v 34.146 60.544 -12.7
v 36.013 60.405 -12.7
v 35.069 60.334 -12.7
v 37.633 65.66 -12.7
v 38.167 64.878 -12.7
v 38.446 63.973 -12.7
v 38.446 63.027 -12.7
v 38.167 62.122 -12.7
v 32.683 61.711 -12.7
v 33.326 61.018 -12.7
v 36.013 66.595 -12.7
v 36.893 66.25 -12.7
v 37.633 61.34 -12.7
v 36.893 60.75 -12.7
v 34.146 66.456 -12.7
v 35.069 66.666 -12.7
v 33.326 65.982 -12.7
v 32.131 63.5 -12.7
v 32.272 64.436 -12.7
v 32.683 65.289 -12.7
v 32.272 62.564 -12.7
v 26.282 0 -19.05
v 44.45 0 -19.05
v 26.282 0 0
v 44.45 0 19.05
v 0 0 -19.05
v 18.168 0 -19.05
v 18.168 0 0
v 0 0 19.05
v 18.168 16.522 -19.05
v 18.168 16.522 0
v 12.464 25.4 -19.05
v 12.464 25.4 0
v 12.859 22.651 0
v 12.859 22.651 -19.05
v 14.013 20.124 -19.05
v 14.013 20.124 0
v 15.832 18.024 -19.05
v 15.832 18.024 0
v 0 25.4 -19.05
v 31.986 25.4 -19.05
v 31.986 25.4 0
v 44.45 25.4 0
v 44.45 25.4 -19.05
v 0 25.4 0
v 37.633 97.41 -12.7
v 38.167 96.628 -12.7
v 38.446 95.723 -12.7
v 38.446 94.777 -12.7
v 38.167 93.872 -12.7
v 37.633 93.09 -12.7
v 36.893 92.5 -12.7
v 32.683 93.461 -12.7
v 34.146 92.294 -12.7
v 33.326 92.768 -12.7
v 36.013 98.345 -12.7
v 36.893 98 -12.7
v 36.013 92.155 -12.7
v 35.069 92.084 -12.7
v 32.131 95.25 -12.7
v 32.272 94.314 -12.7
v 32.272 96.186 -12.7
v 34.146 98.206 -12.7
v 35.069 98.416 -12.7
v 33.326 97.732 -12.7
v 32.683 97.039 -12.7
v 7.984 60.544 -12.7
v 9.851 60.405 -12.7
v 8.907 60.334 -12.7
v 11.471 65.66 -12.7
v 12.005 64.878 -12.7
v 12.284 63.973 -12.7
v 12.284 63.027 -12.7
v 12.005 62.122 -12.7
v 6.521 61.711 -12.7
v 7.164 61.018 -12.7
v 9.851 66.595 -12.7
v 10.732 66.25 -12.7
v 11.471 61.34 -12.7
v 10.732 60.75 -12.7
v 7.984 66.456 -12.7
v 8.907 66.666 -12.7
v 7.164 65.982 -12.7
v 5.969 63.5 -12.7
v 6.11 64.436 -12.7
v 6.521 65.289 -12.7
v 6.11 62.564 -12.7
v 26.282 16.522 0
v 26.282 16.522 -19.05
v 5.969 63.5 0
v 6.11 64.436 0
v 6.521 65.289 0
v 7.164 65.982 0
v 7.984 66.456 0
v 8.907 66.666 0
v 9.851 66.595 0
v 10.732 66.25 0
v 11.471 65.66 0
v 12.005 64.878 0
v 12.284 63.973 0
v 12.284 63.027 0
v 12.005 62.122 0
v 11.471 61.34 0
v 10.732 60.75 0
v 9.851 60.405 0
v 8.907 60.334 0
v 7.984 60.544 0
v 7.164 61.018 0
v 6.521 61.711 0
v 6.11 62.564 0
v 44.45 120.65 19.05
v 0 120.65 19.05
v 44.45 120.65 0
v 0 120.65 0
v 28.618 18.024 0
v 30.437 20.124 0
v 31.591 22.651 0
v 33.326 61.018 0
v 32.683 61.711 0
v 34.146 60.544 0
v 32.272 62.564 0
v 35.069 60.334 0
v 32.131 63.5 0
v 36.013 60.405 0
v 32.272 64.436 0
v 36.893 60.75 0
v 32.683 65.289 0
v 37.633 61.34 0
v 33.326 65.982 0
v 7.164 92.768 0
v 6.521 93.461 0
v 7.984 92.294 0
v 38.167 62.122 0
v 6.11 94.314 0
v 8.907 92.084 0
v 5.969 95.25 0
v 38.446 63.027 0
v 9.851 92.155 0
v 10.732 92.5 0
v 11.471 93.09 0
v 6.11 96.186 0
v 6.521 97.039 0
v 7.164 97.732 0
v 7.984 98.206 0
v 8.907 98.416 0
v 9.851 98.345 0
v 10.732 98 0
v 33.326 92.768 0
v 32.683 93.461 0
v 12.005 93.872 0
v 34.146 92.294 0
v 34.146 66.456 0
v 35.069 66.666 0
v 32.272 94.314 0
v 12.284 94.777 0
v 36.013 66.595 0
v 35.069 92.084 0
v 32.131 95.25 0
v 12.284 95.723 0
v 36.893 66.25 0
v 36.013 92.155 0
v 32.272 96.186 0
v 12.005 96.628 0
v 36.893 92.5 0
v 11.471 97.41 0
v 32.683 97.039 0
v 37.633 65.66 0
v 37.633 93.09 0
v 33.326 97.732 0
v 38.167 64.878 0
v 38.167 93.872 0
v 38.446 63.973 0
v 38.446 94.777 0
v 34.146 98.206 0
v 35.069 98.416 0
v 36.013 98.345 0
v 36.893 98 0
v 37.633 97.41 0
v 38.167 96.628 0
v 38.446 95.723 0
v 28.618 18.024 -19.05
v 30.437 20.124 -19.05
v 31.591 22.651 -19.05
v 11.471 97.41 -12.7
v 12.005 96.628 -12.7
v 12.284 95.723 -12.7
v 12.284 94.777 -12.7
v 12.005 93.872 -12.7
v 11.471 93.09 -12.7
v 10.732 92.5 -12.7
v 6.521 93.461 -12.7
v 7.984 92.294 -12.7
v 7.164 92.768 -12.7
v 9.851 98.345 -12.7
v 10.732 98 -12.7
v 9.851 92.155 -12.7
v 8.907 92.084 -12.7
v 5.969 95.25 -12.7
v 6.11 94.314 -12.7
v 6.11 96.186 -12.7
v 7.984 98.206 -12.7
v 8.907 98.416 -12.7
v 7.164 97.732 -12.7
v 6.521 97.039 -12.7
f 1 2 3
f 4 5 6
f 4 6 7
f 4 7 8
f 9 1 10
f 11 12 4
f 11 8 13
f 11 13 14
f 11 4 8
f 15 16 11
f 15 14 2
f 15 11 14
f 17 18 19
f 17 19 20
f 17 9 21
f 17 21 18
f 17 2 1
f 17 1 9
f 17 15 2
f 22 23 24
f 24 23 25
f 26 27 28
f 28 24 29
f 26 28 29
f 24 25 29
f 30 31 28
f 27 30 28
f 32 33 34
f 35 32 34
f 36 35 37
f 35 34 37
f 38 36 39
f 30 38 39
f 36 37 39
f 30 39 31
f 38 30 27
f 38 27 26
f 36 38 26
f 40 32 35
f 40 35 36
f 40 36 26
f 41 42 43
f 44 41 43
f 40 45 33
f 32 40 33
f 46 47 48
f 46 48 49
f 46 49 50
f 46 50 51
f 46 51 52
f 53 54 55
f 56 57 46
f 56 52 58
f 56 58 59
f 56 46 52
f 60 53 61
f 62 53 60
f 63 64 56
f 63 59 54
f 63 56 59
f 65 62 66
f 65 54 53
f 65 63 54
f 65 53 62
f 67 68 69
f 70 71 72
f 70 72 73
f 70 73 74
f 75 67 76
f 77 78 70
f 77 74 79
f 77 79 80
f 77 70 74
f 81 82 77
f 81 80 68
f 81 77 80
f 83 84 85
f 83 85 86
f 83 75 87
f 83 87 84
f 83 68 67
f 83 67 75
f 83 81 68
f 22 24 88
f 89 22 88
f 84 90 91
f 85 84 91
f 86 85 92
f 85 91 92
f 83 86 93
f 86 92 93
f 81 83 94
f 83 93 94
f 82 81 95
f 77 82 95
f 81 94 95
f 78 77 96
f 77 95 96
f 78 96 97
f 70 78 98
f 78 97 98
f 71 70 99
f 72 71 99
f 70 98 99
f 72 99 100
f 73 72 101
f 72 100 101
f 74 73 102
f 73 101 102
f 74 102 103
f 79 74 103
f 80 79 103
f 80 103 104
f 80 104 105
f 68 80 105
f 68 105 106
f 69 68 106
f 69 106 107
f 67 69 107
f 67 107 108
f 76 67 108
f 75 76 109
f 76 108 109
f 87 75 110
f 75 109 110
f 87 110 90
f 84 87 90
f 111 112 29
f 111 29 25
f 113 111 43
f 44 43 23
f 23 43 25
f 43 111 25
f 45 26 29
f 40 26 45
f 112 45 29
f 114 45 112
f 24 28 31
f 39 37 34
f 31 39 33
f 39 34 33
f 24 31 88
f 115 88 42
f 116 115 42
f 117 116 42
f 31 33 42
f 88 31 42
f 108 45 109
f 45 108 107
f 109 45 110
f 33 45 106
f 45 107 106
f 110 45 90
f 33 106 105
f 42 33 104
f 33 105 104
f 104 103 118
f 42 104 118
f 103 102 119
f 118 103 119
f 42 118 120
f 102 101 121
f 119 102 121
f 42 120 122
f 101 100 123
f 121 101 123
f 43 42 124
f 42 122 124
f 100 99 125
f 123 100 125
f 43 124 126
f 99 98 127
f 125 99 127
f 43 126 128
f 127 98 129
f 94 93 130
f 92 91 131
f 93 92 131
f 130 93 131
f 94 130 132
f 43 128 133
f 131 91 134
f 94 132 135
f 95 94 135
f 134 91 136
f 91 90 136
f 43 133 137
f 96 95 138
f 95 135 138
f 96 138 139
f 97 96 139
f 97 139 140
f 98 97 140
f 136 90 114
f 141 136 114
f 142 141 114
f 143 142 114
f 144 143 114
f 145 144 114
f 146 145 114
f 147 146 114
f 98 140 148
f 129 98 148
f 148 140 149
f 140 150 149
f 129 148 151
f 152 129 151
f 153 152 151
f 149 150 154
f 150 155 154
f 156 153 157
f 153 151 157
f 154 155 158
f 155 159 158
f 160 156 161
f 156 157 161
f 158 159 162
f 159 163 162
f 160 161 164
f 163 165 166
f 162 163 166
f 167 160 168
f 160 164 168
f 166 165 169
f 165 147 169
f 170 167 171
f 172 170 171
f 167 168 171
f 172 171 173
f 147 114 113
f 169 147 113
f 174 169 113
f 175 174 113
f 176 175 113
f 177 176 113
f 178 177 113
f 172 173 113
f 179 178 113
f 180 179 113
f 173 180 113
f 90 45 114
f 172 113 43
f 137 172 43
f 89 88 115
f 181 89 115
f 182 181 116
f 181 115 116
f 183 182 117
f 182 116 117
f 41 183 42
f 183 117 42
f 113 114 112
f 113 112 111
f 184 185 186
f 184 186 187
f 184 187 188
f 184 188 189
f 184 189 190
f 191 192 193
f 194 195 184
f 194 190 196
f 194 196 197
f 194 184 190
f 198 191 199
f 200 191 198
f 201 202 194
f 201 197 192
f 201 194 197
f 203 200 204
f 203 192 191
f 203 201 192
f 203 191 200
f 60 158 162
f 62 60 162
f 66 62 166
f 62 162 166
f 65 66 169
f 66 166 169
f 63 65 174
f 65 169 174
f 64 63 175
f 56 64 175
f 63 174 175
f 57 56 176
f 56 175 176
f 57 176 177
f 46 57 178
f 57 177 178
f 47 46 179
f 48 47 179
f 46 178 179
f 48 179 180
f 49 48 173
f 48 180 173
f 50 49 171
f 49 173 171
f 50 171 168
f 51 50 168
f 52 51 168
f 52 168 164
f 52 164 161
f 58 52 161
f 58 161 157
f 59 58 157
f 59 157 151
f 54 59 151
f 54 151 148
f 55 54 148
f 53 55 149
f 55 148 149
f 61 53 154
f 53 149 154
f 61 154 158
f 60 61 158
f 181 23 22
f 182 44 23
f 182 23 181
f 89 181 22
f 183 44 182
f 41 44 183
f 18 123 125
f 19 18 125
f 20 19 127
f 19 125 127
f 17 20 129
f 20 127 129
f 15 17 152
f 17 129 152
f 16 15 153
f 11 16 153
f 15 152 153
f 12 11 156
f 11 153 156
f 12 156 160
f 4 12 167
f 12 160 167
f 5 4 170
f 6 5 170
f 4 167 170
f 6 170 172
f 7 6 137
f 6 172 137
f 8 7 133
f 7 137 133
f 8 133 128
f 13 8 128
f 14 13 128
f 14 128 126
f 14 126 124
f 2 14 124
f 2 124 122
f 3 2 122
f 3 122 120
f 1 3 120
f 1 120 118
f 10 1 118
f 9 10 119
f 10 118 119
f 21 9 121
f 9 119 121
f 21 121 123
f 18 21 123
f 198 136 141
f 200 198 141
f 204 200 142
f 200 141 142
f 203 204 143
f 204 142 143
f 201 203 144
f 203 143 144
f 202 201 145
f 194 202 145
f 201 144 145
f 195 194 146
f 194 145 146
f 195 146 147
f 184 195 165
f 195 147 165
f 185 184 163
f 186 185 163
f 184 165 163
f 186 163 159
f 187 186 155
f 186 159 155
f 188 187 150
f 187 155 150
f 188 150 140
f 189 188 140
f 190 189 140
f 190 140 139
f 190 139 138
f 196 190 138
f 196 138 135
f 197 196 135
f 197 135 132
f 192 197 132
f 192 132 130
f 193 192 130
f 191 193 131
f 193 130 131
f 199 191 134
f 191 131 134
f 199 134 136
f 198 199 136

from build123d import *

# Parameters (mm, degrees)
SKETCH1_W           = 44.45
SKETCH1_H           = 120.65
BOSS_EXTRUDE1_DEPTH = 19.05
BOSS_EXTRUDE2_DEPTH = 19.05
SKETCH2_4_R         = 3.175
BOSS_EXTRUDE3_DEPTH = 12.7


with BuildPart() as part:
    # Sketch1 → Boss-Extrude1 (new body)
    with BuildSketch(Plane.XY):
        with Locations((22.225, 60.325)):
            Rectangle(SKETCH1_W, SKETCH1_H)
    extrude(amount=BOSS_EXTRUDE1_DEPTH)

    # Sketch2 → Boss-Extrude2 (add)
    with BuildSketch(Plane(origin=(0, 0, 0), x_dir=(-1, 0, 0), z_dir=(0, 0, -1))):
        with BuildLine():
            ThreePointArc((-26.281784125, 16.521928603), (-30.437065172, 20.123672226), (-31.986027055, 25.4))
            Line((-31.986027055, 25.4), (-44.45, 25.4))
            Line((-44.45, 25.4), (-44.45, 0))
            Line((-44.45, 0), (-26.281784125, 0))
            Line((-26.281784125, 0), (-26.281784125, 16.521928603))
        make_face()
        with BuildLine():
            Line((0, 25.4), (-12.463972945, 25.4))
            ThreePointArc((-12.463972945, 25.4), (-14.012934828, 20.123672226), (-18.168215875, 16.521928603))
            Line((-18.168215875, 16.521928603), (-18.168215875, 0))
            Line((-18.168215875, 0), (0, 0))
            Line((0, 0), (0, 25.4))
        make_face()
    extrude(amount=BOSS_EXTRUDE2_DEPTH)

    # Sketch2_4 → Boss-Extrude3 (add)
    with BuildSketch(Plane(origin=(0, 0, 0), x_dir=(-1, 0, 0), z_dir=(0, 0, -1))):
        with Locations((-35.306, 95.25)):
            Circle(SKETCH2_4_R)
        with Locations((-35.306, 63.5)):
            Circle(SKETCH2_4_R)
        with Locations((-9.144, 95.25)):
            Circle(SKETCH2_4_R)
        with Locations((-9.144, 63.5)):
            Circle(SKETCH2_4_R)
    extrude(amount=BOSS_EXTRUDE3_DEPTH)


solid = part.part
